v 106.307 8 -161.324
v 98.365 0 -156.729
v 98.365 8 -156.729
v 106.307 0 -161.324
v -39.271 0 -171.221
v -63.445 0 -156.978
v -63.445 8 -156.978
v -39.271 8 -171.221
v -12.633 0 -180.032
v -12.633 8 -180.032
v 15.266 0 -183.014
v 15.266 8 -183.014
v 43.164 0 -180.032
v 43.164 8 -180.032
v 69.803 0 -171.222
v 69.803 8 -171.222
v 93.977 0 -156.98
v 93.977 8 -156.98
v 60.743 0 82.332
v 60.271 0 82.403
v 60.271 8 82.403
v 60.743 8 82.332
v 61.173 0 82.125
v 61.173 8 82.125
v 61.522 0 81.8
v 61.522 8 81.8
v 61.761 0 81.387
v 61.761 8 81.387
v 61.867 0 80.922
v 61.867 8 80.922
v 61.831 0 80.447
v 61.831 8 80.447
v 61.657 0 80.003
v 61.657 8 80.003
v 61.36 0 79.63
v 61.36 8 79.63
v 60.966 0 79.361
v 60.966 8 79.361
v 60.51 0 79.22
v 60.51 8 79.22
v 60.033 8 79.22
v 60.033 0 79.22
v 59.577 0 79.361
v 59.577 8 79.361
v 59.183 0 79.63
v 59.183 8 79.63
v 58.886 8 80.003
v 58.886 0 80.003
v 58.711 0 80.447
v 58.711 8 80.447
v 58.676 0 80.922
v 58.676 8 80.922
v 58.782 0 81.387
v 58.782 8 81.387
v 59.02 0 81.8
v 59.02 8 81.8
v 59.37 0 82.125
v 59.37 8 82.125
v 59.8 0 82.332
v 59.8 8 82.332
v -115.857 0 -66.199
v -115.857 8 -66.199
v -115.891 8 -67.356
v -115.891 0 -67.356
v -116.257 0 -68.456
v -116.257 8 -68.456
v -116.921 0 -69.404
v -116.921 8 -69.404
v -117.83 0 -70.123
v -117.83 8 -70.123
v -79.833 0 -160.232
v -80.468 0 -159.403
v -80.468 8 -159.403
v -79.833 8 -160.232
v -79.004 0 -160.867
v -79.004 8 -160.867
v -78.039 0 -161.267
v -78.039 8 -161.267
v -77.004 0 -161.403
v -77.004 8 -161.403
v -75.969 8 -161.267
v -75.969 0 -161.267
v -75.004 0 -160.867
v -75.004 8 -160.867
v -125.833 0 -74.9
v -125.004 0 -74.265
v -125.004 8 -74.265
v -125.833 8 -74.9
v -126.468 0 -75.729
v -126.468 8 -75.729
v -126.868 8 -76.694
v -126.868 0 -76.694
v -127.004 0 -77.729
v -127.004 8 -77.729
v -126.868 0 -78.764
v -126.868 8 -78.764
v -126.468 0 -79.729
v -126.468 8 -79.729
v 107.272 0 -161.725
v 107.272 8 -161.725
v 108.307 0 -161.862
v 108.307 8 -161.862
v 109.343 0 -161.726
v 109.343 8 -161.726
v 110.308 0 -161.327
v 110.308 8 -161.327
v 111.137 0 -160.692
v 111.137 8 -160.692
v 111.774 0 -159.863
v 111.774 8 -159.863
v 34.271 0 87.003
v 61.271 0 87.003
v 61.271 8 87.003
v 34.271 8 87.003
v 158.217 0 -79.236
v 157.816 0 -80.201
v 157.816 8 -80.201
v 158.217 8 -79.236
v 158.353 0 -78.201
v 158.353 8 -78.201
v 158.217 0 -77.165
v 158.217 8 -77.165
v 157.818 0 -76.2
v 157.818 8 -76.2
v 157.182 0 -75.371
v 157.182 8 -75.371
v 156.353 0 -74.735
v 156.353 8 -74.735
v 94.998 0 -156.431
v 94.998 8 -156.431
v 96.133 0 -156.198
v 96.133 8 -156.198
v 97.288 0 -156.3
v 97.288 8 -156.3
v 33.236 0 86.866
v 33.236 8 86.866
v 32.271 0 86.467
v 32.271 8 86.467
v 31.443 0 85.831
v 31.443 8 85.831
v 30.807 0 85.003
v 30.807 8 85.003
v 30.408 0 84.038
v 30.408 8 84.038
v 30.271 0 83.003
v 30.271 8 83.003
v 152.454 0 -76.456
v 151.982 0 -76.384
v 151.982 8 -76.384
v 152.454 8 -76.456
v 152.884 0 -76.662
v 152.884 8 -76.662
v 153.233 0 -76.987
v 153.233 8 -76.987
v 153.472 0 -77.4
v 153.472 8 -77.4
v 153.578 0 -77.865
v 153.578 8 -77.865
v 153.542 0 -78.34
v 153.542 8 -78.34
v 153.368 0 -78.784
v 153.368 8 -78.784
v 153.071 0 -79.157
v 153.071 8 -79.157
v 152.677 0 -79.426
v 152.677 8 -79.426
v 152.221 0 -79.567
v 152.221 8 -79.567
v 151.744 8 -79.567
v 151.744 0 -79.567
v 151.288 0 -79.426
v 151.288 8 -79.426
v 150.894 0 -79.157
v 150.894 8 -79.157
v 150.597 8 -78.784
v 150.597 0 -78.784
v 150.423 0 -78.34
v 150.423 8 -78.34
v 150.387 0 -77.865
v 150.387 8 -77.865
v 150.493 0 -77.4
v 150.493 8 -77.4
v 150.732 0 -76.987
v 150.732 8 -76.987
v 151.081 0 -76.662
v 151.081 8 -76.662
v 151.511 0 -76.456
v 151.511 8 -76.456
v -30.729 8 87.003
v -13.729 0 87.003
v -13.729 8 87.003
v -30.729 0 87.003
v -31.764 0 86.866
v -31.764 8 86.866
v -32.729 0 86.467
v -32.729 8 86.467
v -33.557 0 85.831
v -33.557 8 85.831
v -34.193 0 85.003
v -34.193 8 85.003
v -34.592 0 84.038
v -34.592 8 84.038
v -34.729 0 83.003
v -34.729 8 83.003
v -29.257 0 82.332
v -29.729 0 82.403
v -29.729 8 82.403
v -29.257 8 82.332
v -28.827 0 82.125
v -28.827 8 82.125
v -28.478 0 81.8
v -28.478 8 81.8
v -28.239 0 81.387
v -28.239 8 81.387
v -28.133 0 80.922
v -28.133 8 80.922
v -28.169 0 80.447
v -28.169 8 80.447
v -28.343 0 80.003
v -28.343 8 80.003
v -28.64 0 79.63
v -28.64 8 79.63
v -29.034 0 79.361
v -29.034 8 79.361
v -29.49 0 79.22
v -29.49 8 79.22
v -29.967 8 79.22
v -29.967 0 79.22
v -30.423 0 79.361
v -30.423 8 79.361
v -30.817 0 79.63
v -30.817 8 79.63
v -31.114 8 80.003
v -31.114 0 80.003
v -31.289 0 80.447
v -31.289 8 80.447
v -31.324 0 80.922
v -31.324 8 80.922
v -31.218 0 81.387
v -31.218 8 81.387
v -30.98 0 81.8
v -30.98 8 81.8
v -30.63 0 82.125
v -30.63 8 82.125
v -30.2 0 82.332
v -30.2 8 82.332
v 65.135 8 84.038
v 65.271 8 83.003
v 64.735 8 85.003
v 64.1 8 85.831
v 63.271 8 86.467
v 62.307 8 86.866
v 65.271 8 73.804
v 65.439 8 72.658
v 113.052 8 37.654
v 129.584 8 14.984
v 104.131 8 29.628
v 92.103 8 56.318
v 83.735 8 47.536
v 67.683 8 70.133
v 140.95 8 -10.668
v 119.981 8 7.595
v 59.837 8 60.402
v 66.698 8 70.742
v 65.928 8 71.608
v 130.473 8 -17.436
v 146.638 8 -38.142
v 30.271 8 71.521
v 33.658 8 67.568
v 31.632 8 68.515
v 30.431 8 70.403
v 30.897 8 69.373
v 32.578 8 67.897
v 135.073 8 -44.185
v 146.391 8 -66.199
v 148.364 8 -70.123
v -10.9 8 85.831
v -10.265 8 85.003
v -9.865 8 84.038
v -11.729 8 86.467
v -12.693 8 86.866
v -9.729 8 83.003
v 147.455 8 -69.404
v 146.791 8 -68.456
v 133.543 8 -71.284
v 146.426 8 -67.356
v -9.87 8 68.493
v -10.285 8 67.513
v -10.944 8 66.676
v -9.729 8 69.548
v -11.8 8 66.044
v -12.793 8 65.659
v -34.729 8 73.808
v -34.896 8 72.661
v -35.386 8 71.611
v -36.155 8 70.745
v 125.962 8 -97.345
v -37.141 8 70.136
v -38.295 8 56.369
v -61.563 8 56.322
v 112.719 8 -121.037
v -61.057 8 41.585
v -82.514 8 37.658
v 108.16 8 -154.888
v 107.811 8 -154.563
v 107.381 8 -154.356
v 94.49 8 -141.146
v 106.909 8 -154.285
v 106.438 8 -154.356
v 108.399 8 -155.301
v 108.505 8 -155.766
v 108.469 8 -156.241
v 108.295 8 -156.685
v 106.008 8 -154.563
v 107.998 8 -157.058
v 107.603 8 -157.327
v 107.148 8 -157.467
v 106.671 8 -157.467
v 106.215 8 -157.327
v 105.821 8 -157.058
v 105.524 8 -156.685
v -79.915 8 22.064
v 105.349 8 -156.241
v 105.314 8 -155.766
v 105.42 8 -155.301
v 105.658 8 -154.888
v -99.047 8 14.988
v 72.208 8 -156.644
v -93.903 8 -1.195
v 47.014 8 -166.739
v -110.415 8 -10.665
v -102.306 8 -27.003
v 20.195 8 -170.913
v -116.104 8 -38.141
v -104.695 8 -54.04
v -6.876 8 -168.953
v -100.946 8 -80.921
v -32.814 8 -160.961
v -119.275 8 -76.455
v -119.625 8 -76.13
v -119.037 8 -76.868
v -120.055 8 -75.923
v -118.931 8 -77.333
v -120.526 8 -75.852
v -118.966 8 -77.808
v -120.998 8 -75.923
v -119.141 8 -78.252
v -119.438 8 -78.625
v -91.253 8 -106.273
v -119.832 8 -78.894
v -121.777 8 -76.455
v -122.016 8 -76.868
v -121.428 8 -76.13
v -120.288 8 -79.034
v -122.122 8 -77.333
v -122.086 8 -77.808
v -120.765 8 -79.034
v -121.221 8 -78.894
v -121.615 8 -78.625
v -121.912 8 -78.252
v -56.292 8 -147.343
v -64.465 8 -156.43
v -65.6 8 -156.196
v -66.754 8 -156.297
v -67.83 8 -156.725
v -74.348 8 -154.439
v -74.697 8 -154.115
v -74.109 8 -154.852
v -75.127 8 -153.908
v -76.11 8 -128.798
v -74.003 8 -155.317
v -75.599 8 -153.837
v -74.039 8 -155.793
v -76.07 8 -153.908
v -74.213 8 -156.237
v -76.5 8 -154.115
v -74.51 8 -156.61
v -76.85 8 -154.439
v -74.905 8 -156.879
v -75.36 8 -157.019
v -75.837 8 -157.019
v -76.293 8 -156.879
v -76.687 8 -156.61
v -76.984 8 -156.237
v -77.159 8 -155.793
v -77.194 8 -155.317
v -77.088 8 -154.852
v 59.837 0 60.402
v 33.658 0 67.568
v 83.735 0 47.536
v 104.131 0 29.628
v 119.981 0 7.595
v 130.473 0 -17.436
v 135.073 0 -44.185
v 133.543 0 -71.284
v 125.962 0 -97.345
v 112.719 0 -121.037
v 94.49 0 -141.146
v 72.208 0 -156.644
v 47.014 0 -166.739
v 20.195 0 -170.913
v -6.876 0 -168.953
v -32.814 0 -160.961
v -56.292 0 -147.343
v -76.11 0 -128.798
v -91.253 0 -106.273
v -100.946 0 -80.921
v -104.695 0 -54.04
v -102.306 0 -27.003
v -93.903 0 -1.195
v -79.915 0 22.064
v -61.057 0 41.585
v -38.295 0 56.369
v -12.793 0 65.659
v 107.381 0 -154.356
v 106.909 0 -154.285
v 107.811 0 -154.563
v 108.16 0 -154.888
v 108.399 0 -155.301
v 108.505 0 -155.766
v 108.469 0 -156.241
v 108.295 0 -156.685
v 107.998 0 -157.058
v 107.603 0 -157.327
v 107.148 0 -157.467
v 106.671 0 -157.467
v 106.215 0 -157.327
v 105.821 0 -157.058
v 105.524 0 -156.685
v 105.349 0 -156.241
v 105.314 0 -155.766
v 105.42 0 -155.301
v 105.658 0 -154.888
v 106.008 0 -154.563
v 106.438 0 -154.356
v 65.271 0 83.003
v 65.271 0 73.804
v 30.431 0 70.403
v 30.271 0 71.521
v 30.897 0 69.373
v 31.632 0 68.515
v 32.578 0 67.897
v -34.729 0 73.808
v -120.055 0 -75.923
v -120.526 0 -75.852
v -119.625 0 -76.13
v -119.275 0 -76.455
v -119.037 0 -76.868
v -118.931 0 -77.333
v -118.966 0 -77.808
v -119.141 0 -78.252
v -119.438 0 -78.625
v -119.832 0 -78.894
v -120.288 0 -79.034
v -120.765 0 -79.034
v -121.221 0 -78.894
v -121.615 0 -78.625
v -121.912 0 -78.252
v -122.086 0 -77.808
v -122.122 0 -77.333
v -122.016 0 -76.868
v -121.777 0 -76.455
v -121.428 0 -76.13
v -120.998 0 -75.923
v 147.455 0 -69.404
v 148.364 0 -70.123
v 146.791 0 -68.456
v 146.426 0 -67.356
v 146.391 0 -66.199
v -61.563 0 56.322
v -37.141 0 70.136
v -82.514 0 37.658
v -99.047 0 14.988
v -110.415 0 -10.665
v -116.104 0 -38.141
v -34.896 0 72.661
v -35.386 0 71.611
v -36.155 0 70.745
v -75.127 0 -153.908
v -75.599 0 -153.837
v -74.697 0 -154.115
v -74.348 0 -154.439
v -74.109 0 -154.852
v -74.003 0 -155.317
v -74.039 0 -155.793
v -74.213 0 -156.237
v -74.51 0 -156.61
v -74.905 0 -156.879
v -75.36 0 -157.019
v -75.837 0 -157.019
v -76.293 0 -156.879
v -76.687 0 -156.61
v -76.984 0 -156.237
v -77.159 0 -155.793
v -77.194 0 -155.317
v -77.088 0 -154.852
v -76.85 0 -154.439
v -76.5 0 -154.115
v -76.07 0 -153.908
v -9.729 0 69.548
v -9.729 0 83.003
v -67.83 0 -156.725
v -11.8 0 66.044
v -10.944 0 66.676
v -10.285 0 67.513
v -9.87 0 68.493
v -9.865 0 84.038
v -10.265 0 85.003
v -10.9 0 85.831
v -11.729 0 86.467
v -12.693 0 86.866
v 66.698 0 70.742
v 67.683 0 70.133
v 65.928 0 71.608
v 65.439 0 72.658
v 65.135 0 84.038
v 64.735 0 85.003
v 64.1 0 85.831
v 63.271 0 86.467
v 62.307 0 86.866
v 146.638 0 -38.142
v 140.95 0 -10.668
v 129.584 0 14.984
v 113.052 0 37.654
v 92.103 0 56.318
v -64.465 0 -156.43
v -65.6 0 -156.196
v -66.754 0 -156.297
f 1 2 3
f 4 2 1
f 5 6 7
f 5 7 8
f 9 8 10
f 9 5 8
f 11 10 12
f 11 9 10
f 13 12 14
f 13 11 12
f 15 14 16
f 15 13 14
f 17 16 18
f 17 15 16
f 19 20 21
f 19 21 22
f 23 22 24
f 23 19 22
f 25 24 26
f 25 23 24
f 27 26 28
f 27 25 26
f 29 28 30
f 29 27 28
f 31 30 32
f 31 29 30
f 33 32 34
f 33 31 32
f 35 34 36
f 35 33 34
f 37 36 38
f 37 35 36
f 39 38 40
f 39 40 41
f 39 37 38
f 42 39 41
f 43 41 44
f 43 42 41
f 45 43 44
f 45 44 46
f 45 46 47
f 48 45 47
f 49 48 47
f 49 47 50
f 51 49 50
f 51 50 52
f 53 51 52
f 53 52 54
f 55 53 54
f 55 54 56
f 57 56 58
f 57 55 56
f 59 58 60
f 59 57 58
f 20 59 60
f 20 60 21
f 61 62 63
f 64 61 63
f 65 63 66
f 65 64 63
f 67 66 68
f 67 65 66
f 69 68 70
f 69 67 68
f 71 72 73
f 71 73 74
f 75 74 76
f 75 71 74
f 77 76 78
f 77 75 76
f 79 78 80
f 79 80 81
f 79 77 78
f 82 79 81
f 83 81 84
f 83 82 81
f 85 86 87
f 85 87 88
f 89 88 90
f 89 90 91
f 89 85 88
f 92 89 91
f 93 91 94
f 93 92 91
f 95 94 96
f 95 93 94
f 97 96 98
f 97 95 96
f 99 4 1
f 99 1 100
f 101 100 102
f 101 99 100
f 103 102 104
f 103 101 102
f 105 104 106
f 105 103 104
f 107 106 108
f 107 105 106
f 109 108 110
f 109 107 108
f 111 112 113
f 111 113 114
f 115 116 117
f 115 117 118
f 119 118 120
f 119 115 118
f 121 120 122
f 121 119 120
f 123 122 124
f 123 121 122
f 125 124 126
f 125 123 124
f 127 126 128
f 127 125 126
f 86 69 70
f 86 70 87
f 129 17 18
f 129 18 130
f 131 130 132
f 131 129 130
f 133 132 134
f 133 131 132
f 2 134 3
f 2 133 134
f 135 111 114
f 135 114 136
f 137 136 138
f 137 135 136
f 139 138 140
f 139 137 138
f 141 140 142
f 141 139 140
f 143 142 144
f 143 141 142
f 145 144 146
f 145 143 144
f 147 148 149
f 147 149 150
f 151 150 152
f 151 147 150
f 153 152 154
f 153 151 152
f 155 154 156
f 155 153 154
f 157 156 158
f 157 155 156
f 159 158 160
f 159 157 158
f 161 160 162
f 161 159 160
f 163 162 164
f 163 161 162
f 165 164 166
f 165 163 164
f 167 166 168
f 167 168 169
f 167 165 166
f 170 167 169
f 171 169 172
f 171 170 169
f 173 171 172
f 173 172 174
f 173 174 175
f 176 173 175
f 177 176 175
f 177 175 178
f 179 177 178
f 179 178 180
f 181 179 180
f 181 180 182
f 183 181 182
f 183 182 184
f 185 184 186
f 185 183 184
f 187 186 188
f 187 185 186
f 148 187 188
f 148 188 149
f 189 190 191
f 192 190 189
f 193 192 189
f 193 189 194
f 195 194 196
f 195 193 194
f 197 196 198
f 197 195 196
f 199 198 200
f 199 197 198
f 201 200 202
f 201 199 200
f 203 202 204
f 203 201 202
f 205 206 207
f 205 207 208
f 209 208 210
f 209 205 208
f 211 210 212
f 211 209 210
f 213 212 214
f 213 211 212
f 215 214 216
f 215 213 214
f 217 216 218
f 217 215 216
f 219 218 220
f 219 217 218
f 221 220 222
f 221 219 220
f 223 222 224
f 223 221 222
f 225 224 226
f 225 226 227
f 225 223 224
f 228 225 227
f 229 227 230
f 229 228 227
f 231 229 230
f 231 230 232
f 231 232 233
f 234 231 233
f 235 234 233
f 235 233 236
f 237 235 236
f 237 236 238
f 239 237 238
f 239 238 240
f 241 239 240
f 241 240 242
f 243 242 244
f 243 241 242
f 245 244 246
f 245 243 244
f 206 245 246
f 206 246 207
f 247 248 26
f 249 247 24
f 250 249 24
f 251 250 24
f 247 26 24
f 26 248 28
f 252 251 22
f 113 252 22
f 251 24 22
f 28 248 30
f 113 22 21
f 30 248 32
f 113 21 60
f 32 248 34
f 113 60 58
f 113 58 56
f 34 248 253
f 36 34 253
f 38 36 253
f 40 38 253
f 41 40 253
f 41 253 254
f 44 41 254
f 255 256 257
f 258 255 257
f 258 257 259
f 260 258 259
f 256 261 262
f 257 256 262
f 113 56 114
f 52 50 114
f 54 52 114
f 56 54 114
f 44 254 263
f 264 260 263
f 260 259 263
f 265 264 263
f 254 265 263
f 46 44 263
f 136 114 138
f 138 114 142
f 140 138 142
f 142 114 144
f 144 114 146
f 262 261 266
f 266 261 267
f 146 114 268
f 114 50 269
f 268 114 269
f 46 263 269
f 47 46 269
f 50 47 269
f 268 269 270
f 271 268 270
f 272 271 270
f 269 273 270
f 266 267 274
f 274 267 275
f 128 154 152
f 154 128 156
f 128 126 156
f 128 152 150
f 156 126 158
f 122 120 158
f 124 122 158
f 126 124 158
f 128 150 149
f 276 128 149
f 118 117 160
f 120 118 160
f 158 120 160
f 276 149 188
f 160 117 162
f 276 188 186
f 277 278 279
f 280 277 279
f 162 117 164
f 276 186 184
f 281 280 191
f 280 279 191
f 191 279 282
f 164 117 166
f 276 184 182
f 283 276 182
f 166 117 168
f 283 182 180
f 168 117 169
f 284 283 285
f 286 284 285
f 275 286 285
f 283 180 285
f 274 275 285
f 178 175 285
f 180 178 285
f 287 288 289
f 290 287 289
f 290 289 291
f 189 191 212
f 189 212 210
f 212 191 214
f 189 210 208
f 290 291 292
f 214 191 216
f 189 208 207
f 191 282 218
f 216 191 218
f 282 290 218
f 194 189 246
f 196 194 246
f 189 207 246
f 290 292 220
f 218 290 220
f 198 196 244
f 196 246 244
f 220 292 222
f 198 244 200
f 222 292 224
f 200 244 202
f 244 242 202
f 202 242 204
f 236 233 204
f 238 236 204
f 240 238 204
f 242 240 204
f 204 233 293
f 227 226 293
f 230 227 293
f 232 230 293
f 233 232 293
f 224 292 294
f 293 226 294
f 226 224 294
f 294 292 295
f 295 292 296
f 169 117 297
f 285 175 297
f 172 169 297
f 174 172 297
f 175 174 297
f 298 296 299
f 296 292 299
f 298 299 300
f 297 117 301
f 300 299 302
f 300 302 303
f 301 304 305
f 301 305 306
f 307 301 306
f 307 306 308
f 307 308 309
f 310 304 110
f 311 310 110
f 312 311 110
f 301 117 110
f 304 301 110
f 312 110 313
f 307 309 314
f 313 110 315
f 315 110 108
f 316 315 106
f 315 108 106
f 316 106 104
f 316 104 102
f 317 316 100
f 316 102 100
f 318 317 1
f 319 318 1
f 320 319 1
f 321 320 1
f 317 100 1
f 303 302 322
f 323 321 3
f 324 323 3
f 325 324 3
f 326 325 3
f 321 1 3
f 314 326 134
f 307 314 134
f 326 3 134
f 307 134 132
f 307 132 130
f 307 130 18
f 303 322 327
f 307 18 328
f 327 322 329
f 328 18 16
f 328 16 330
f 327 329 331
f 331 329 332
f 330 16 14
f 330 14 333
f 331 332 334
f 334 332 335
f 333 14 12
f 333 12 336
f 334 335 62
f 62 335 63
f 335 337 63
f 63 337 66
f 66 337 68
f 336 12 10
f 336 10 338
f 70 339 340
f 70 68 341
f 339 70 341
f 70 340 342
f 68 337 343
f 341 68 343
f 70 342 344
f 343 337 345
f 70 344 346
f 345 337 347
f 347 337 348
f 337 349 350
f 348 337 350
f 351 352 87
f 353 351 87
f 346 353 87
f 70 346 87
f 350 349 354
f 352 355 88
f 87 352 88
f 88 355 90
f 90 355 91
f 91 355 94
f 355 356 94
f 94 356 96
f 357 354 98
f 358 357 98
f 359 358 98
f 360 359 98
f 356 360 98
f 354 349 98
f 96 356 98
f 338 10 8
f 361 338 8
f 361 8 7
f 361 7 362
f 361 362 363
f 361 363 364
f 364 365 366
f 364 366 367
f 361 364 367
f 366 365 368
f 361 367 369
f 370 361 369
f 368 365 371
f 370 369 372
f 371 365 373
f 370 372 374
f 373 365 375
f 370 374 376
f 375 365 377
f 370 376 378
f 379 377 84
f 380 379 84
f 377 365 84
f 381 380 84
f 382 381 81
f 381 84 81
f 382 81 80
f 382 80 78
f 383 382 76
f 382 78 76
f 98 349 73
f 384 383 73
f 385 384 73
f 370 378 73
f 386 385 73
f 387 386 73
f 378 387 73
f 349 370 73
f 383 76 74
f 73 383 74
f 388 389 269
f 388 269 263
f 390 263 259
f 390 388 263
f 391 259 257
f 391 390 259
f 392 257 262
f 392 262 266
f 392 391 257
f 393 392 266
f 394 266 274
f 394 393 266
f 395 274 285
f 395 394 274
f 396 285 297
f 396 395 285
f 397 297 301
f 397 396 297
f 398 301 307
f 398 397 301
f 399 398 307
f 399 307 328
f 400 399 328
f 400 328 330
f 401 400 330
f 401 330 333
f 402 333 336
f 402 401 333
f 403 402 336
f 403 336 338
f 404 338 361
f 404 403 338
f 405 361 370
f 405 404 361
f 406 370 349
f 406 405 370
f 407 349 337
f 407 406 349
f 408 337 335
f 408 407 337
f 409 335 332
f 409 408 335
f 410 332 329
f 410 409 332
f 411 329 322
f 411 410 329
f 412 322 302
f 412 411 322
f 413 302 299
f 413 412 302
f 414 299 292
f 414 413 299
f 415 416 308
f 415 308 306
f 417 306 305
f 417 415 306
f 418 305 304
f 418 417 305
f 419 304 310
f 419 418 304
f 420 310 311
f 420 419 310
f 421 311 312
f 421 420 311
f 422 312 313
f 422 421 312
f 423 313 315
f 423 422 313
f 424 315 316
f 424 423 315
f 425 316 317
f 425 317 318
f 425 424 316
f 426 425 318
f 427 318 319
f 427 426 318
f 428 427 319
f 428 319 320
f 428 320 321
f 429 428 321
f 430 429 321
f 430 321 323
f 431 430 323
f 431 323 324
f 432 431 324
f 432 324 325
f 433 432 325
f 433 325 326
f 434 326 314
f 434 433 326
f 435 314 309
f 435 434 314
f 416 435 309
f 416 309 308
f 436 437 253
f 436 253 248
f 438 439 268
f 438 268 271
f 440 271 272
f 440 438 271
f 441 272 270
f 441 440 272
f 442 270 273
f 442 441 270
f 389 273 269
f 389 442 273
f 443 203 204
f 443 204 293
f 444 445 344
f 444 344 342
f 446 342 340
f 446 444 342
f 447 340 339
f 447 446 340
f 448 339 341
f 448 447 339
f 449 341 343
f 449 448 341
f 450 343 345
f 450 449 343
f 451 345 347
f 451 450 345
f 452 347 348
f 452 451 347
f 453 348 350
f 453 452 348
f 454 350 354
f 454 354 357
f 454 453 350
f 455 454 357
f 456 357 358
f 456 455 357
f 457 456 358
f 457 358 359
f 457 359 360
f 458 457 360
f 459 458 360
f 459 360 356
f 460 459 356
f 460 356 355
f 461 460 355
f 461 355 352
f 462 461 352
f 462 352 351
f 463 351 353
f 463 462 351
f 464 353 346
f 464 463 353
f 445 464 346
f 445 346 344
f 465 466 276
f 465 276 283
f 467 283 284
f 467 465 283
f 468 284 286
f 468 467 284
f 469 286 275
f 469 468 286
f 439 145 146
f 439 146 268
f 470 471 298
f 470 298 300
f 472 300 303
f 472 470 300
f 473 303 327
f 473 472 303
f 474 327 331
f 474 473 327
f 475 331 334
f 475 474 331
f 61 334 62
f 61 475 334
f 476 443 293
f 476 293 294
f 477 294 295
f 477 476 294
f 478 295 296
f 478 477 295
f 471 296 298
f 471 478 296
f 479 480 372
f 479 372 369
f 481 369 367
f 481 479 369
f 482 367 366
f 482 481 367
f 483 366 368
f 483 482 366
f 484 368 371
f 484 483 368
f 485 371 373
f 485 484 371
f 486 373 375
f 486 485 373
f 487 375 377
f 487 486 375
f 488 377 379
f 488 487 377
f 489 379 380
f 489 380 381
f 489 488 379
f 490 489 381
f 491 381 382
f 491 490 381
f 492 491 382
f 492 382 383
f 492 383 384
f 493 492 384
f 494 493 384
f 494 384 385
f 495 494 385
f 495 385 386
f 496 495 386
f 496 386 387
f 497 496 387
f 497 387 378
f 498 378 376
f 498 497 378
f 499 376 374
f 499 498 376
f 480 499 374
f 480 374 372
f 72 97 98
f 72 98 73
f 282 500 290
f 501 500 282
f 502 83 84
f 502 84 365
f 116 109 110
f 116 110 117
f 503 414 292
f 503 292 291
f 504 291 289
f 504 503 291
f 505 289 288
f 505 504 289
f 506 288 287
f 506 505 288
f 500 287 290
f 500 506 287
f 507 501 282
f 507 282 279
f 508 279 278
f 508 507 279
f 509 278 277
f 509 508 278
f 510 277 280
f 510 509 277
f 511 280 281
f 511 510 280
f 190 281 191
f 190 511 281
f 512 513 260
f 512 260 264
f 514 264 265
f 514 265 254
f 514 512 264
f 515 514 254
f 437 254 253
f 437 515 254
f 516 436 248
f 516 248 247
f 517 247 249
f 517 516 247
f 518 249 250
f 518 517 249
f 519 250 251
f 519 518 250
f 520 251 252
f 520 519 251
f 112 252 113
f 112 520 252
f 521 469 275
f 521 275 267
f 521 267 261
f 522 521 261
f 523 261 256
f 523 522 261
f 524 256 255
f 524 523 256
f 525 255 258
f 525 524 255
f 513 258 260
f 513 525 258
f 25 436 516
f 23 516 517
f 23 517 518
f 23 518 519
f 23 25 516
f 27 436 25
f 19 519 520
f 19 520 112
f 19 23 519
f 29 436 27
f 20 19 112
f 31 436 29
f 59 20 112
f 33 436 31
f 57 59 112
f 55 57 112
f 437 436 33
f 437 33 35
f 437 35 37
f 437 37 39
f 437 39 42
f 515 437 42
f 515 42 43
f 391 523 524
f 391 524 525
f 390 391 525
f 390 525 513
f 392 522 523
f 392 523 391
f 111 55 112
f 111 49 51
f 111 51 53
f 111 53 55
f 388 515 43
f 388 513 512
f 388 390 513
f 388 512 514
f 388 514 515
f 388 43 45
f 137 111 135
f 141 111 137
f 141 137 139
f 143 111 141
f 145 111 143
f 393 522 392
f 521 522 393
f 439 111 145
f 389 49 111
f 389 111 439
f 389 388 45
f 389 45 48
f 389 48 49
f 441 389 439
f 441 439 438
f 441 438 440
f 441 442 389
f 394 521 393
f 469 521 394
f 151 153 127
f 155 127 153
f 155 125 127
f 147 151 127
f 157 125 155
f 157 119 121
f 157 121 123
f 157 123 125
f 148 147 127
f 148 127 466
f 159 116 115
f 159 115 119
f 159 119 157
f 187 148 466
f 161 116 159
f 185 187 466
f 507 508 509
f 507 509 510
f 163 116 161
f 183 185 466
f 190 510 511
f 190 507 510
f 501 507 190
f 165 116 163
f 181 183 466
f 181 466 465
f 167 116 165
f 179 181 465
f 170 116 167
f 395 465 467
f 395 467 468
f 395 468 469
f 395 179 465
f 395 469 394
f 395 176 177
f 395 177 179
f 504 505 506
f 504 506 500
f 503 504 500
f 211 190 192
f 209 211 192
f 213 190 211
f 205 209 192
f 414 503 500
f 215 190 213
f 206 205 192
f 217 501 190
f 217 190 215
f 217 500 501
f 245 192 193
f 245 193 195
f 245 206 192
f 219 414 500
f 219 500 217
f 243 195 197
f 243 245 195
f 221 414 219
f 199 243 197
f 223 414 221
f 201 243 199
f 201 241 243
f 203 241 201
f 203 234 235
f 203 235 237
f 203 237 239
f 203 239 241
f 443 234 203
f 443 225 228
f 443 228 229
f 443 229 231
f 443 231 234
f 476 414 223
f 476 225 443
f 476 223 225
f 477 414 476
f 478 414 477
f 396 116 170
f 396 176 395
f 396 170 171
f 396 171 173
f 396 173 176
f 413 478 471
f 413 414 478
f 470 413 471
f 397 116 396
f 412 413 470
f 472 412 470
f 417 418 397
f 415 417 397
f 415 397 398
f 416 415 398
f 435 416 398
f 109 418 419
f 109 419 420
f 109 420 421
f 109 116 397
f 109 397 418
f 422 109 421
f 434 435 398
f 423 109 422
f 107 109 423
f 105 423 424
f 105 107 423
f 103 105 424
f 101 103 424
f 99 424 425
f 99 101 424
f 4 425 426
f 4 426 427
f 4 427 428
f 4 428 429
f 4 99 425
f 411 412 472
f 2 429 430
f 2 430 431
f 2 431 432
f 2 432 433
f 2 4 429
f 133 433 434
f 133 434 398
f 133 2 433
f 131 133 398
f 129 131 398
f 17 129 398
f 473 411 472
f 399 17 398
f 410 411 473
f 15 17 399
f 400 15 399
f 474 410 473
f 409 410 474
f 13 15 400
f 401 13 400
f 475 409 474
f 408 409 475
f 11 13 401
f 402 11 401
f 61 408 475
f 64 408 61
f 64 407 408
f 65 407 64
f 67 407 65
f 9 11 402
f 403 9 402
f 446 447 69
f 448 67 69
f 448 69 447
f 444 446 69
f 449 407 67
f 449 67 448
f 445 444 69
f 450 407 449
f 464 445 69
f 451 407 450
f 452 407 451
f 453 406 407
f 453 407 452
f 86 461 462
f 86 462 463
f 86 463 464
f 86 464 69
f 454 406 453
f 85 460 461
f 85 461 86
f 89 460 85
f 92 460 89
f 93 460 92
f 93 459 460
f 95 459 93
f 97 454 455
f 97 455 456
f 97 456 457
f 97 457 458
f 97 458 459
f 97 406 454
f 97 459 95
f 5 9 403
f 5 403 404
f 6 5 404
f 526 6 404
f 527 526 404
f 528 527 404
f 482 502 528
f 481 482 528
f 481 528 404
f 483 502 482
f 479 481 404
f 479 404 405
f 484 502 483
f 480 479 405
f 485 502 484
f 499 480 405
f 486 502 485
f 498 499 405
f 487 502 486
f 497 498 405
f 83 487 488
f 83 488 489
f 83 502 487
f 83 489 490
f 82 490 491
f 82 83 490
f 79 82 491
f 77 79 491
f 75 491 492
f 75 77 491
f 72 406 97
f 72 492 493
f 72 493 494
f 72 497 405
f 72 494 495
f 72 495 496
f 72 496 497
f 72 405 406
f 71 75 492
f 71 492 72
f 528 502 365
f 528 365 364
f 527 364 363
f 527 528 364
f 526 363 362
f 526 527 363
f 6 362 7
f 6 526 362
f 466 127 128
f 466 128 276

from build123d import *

# Parameters (mm, degrees)
SKETCH1_R           = 1.6
BOSS_EXTRUDE2_DEPTH = 8


with BuildPart() as part:
    # Sketch1 → Boss-Extrude2 (new body)
    with BuildSketch(Plane(origin=(0, 0, 0), x_dir=(1, 0, 0), z_dir=(0, 1, 0))):
        with BuildLine():
            Line((-75.004193667, 160.867236212), (-67.830157516, 156.725304509))
            ThreePointArc((-67.830157516, 156.725304509), (-65.599707636, 156.196050035), (-63.444946383, 156.978367686))
            ThreePointArc((-63.444946383, 156.978367686), (15.265708014, 183.014099207), (93.976880337, 156.979933523))
            ThreePointArc((93.976880337, 156.979933523), (96.133483562, 156.197553795), (98.365264281, 156.728788517))
            Line((98.365264281, 156.728788517), (106.307271021, 161.324010437))
            ThreePointArc((106.307271021, 161.324010437), (109.343075496, 161.726207543), (111.773674482, 159.863397867))
            Line((111.773674482, 159.863397867), (157.816436501, 80.200975925))
            ThreePointArc((157.816436501, 80.200975925), (158.217214787, 77.164984073), (156.353269729, 74.735255986))
            Line((156.353269729, 74.735255986), (148.364199487, 70.122764131))
            ThreePointArc((148.364199487, 70.122764131), (146.790626728, 68.45576511), (146.390753061, 66.198528301))
            ThreePointArc((146.390753061, 66.198528301), (129.583526562, -14.983904944), (67.683015931, -70.132768158))
            ThreePointArc((67.683015931, -70.132768158), (65.928218191, -71.607690224), (65.271379414, -73.803885351))
            Line((65.271379414, -73.803885351), (65.271379414, -83.002595828))
            ThreePointArc((65.271379414, -83.002595828), (64.099806539, -85.831022953), (61.271379414, -87.002595828))
            Line((61.271379414, -87.002595828), (34.271379414, -87.002595828))
            ThreePointArc((34.271379414, -87.002595828), (31.44295229, -85.831022953), (30.271379414, -83.002595828))
            Line((30.271379414, -83.002595828), (30.271379414, -71.520933984))
            ThreePointArc((30.271379414, -71.520933984), (31.233931861, -68.918259905), (33.658335594, -67.568190978))
            ThreePointArc((33.658335594, -67.568190978), (20.194853463, 170.912875133), (-12.793277309, -65.659032482))
            ThreePointArc((-12.793277309, -65.659032482), (-10.586855707, -67.072391843), (-9.728620586, -69.548136872))
            Line((-9.728620586, -69.548136872), (-9.728620586, -83.002595828))
            ThreePointArc((-9.728620586, -83.002595828), (-10.900193461, -85.831022953), (-13.728620586, -87.002595828))
            Line((-13.728620586, -87.002595828), (-30.728620586, -87.002595828))
            ThreePointArc((-30.728620586, -87.002595828), (-33.55704771, -85.831022953), (-34.728620586, -83.002595828))
            Line((-34.728620586, -83.002595828), (-34.728620586, -73.807656468))
            ThreePointArc((-34.728620586, -73.807656468), (-35.38553605, -71.611344607), (-37.140513481, -70.136428359))
            ThreePointArc((-37.140513481, -70.136428359), (-99.047180019, -14.987896579), (-115.856711089, 66.198528301))
            ThreePointArc((-115.856711089, 66.198528301), (-116.256584757, 68.45576511), (-117.830157516, 70.122764131))
            Line((-117.830157516, 70.122764131), (-125.004193667, 74.264695834))
            ThreePointArc((-125.004193667, 74.264695834), (-126.867896972, 76.693521268), (-126.468295282, 79.728797449))
            Line((-126.468295282, 79.728797449), (-80.468295282, 159.403134597))
            ThreePointArc((-80.468295282, 159.403134597), (-78.039469847, 161.266837902), (-75.004193667, 160.867236212))
        make_face()
        with Locations(Location((-75.598775183, 155.43701163, 0), (0, 0, 270))):
            Circle(SKETCH1_R, mode=Mode.SUBTRACT)
        with Locations(Location((-120.526355361, 77.452098276, 0), (0, 0, 270))):
            Circle(SKETCH1_R, mode=Mode.SUBTRACT)
        with Locations(Location((106.909257313, 155.885291293, 0), (0, 0, 270))):
            Circle(SKETCH1_R, mode=Mode.SUBTRACT)
        with Locations(Location((151.982456893, 77.984449703, 0), (0, 0, 270))):
            Circle(SKETCH1_R, mode=Mode.SUBTRACT)
        with Locations(Location((-29.728620586, -80.802595828, 0), (0, 0, 270))):
            Circle(SKETCH1_R, mode=Mode.SUBTRACT)
        with Locations(Location((60.271379414, -80.802595828, 0), (0, 0, 270))):
            Circle(SKETCH1_R, mode=Mode.SUBTRACT)
    extrude(amount=BOSS_EXTRUDE2_DEPTH)


solid = part.part
